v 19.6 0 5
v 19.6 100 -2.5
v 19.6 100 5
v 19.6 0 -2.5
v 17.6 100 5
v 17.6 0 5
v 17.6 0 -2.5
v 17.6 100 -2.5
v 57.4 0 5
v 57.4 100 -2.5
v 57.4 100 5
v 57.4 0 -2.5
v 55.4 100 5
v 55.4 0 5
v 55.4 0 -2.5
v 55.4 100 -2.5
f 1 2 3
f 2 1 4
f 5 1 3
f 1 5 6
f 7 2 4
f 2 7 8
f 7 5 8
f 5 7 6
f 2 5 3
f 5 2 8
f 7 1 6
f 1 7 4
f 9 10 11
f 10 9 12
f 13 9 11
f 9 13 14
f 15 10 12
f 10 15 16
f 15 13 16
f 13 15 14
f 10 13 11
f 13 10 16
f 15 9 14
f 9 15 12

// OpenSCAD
//////////////////////////
// Customizer Settings: //
//////////////////////////
/* [Cubby] */
Section="all"; // ["all":All, "top":Top, "bottom":Bottom]
Shape="circle"; //["rectangle": Rectangle, "circle":Circle]
//Cubby Width (mm)
Width=100;
//Cubby Depth (mm). 
Depth=75;

/* [beams] */
//Spacing of beams (mm)
Spacing=10;
//Number of beams, overrides spacing
BeamsCount=0;
//Height of main beams (mm). Does NOT include feet, lips, or tails
Height=10; // /0.1
//Thickness of beams (mm)
Thickness=2;  // 0.1

/* [cross beams] */
//Height of cross beams (mm). Default if 0, Beam Height *3/4
CrossbeamHeight=0; 
//Thickness of all parts (mm). Default if 0, Beam Thickness
CrossbeamThickness=0;  
//CrossBeam position on beams, 0 start 1 end.
CrossbeamPositions = [0.2, 0.8]; //0-1 0.05

/* [tray] */
//thickness of drip tray
TrayThickness = 2;// 0.1
//Angle of drip tray (Will need to adjust based on depth)
TrayAngle = 2; // 0.1

/* [feet] */
//Do you want feet on the bottom? 
Feet="y"; // ["y":Yes, "n":No]
//Interval of feet on beams, feet are always on first and last beam? 
FeetInterval = 1;
//feet diameter default if 0 is height (mm)
FeetSize=0; // 0.1
//feet thickness, default if 0 is Beam Thickness (mm)
FeetThickness=0; // 0.1
//Feet position on beams, 0 start 1 end.
FeetPosition = [0.05, 0.95]; //0.05
/* [tail] */
//Do you want a tail sticking up on the rear? 
Tail="n"; // ["y":Yes, "n":No]
/* [lip] */
//Do you want a lip sticking up on the front? 
Lip="n"; // ["y":Yes, "n":No]    

//////////////////////
// Static Settings: //
//////////////////////
$fn=60;

_feetSize = FeetSize > 0 ? FeetSize : Height;
_feetThickness = FeetThickness >0 ? FeetThickness : Thickness;
_crossbeamHeight = CrossbeamHeight > 0 ? CrossbeamHeight : 3*Height/4;
_crossbeamThickness = CrossbeamThickness > 0 ? CrossbeamThickness : Thickness;
_trayThickness = TrayThickness > 0 ? TrayThickness : Thickness;


difference(){
  intersection(){
    union(){
      color ("darkblue")
      //Base beams
      if(Shape=="rectangle"){
        Base(
          Depth,  
          Height,
          Width,
          Thickness,
          Spacing,
          BeamsCount,
          Feet,
          _feetSize,
          _feetThickness,
          FeetInterval,
          FeetPosition,
          Lip,
          Tail);
      }
      if(Shape=="circle"){
        RoundBase(
          Depth,  
          Height,
          Width,
          Thickness,
          Spacing,
          BeamsCount,
          Feet,
          _feetSize,
          _feetThickness,
          FeetInterval,
          FeetPosition,
          Lip,
          Tail);
      }
      
      
      
      difference() {
        union() {
          for (i=[0:len(CrossbeamPositions)-1]) {
            pos = Height/2+ (Depth - Height-_crossbeamThickness)*CrossbeamPositions[i];
            translate([pos,0,Height/2-_crossbeamHeight]) 
              CrossBeam(Width, _crossbeamHeight, _crossbeamThickness);   
          }  
        }
      
        if (Section=="top") {
          // add gap under crossbeams, when adding a shelf to allow water to drain.
          DripTray(Height, _trayThickness+Thickness, Depth, Width, TrayAngle);
        }
      }

      
      if (Section=="bottom") {
        color ("green")
        intersection() {
          DripTray(Height, _trayThickness, Depth, Width, TrayAngle);
          Beam(Depth, Height, Width, "y", _feetSize, _feetThickness, FeetPosition, "y", "y"); 
        } 
      }
    };

    if (Section=="bottom") {
      color ("green")
      DripTrayCutaway(Height, _trayThickness, Depth, Width, TrayAngle);
    }
  }  
  if (Section=="top") 
  {
    DripTrayCutaway(Height, _trayThickness, Depth, Width, TrayAngle);
  }
}

module RoundBase(
  depth,  
  height,
  width,
  thickness,
  spacing,
  beamsCount,
  feet,
  feetSize,
  feetThickness,
  feetInterval,
  feetPosition,
  lip,
  tail,
  crossbeamHeight,
  crossbeamThickness,
){

  echo(width= width, thickness = thickness, beamsCount =beamsCount);
  for(n = [0 : 1 : beamsCount-1]) 
  {
    echo(count = count, n = n);
    //rotate(180/n*n)
    Beam(depth, height, thickness, feet, feetSize, feetThickness, feetPosition, lip, tail);
  }
}

module Base(
  depth,  
  height,
  width,
  thickness,
  spacing,
  beamsCount,
  feet,
  feetSize,
  feetThickness,
  feetInterval,
  feetPosition,
  lip,
  tail,
  crossbeamHeight,
  crossbeamThickness,
){
  indentation = beamsCount > 0 ? 0 : ((width-thickness)%spacing)/2;
  _spacing = beamsCount > 0 ? (Width - Thickness) / (BeamsCount - 1) : spacing;
  count = beamsCount > 0 ? beamsCount : ceil((width-thickness)/_spacing);
  echo(width= width, thickness = thickness, count =count, spacing = spacing, total = count*spacing, remainder = (width-thickness)%spacing);

  for(n = [0 : 1 : count -1]) 
  {
    _n = indentation + n * _spacing;
    _feet = (n==0 || n==count || n%feetInterval == 0) ? feet : "n";
    echo(count = count, n = n, _n = _n ,_feet);

    //base beams
    translate([0,_n,0]) 
      Beam(depth, height, thickness, _feet, feetSize, feetThickness, feetPosition, lip, tail);
  }
}

module Beam(
  depth,  
  height,
  thickness,
  feet,
  feetSize,
  feetThickness,
  feetPosition,
  lip,
  tail) 
{
  translate([height/2,0,0]) 
  union()
  {
    rotate([-90,0,0]) 
    hull(){
      translate([depth-height,0,0]) 
        cylinder(d=height,h=thickness);   
      cylinder(d=height,h=thickness);
    }
    if (feet=="y") {
      for (i=[0:len(feetPosition)-1]) {
        pos = feetSize/2+ (depth - feetSize-height)*feetPosition[i];
        echo(i = i, feetpos = feetPosition[i], pos = pos, depth=depth,feetSize=feetSize);
        translate([pos,(thickness-feetThickness)/2,-height/2])
          rotate([-90,0,0])
          cylinder(d=feetSize,h=feetThickness);
      }
    }
    
    if (lip=="y") {
      translate([depth-3*height/4,0,height/2])
        rotate([-90,0,0]) 
        cylinder(r=height/4,h=thickness);
      translate([depth-height,0,0]) 
        cube([height/2,thickness,height/2]);
    }
    
    if (tail=="y") { 
      translate([-height/4,0,3*height/4]) 
        rotate([-90,0,0]) 
        cylinder(r=height/4,h=thickness);    
      translate([-height/2,0,0]) 
        cube([height/2,thickness,3*height/4]);
    }
  }
}

module CrossBeam(
  width,  
  height,
  thickness) 
{
  cube([thickness,width,height]);
}

module DripTray(
  height,
  thickness,
  depth,
  width,
  angle)
{
    translate([height,0,0])
    rotate([0,angle,0]) 
    cube([depth,width,thickness]);    
}

module DripTrayCutaway(
  height,
  thickness,
  depth,
  width,
  angle)
{
  translate([height,0,0])
  rotate([0,angle,0]) 
  translate([0,0,-(height*2-thickness)])
  cube([depth,width,height*2]);    
}
